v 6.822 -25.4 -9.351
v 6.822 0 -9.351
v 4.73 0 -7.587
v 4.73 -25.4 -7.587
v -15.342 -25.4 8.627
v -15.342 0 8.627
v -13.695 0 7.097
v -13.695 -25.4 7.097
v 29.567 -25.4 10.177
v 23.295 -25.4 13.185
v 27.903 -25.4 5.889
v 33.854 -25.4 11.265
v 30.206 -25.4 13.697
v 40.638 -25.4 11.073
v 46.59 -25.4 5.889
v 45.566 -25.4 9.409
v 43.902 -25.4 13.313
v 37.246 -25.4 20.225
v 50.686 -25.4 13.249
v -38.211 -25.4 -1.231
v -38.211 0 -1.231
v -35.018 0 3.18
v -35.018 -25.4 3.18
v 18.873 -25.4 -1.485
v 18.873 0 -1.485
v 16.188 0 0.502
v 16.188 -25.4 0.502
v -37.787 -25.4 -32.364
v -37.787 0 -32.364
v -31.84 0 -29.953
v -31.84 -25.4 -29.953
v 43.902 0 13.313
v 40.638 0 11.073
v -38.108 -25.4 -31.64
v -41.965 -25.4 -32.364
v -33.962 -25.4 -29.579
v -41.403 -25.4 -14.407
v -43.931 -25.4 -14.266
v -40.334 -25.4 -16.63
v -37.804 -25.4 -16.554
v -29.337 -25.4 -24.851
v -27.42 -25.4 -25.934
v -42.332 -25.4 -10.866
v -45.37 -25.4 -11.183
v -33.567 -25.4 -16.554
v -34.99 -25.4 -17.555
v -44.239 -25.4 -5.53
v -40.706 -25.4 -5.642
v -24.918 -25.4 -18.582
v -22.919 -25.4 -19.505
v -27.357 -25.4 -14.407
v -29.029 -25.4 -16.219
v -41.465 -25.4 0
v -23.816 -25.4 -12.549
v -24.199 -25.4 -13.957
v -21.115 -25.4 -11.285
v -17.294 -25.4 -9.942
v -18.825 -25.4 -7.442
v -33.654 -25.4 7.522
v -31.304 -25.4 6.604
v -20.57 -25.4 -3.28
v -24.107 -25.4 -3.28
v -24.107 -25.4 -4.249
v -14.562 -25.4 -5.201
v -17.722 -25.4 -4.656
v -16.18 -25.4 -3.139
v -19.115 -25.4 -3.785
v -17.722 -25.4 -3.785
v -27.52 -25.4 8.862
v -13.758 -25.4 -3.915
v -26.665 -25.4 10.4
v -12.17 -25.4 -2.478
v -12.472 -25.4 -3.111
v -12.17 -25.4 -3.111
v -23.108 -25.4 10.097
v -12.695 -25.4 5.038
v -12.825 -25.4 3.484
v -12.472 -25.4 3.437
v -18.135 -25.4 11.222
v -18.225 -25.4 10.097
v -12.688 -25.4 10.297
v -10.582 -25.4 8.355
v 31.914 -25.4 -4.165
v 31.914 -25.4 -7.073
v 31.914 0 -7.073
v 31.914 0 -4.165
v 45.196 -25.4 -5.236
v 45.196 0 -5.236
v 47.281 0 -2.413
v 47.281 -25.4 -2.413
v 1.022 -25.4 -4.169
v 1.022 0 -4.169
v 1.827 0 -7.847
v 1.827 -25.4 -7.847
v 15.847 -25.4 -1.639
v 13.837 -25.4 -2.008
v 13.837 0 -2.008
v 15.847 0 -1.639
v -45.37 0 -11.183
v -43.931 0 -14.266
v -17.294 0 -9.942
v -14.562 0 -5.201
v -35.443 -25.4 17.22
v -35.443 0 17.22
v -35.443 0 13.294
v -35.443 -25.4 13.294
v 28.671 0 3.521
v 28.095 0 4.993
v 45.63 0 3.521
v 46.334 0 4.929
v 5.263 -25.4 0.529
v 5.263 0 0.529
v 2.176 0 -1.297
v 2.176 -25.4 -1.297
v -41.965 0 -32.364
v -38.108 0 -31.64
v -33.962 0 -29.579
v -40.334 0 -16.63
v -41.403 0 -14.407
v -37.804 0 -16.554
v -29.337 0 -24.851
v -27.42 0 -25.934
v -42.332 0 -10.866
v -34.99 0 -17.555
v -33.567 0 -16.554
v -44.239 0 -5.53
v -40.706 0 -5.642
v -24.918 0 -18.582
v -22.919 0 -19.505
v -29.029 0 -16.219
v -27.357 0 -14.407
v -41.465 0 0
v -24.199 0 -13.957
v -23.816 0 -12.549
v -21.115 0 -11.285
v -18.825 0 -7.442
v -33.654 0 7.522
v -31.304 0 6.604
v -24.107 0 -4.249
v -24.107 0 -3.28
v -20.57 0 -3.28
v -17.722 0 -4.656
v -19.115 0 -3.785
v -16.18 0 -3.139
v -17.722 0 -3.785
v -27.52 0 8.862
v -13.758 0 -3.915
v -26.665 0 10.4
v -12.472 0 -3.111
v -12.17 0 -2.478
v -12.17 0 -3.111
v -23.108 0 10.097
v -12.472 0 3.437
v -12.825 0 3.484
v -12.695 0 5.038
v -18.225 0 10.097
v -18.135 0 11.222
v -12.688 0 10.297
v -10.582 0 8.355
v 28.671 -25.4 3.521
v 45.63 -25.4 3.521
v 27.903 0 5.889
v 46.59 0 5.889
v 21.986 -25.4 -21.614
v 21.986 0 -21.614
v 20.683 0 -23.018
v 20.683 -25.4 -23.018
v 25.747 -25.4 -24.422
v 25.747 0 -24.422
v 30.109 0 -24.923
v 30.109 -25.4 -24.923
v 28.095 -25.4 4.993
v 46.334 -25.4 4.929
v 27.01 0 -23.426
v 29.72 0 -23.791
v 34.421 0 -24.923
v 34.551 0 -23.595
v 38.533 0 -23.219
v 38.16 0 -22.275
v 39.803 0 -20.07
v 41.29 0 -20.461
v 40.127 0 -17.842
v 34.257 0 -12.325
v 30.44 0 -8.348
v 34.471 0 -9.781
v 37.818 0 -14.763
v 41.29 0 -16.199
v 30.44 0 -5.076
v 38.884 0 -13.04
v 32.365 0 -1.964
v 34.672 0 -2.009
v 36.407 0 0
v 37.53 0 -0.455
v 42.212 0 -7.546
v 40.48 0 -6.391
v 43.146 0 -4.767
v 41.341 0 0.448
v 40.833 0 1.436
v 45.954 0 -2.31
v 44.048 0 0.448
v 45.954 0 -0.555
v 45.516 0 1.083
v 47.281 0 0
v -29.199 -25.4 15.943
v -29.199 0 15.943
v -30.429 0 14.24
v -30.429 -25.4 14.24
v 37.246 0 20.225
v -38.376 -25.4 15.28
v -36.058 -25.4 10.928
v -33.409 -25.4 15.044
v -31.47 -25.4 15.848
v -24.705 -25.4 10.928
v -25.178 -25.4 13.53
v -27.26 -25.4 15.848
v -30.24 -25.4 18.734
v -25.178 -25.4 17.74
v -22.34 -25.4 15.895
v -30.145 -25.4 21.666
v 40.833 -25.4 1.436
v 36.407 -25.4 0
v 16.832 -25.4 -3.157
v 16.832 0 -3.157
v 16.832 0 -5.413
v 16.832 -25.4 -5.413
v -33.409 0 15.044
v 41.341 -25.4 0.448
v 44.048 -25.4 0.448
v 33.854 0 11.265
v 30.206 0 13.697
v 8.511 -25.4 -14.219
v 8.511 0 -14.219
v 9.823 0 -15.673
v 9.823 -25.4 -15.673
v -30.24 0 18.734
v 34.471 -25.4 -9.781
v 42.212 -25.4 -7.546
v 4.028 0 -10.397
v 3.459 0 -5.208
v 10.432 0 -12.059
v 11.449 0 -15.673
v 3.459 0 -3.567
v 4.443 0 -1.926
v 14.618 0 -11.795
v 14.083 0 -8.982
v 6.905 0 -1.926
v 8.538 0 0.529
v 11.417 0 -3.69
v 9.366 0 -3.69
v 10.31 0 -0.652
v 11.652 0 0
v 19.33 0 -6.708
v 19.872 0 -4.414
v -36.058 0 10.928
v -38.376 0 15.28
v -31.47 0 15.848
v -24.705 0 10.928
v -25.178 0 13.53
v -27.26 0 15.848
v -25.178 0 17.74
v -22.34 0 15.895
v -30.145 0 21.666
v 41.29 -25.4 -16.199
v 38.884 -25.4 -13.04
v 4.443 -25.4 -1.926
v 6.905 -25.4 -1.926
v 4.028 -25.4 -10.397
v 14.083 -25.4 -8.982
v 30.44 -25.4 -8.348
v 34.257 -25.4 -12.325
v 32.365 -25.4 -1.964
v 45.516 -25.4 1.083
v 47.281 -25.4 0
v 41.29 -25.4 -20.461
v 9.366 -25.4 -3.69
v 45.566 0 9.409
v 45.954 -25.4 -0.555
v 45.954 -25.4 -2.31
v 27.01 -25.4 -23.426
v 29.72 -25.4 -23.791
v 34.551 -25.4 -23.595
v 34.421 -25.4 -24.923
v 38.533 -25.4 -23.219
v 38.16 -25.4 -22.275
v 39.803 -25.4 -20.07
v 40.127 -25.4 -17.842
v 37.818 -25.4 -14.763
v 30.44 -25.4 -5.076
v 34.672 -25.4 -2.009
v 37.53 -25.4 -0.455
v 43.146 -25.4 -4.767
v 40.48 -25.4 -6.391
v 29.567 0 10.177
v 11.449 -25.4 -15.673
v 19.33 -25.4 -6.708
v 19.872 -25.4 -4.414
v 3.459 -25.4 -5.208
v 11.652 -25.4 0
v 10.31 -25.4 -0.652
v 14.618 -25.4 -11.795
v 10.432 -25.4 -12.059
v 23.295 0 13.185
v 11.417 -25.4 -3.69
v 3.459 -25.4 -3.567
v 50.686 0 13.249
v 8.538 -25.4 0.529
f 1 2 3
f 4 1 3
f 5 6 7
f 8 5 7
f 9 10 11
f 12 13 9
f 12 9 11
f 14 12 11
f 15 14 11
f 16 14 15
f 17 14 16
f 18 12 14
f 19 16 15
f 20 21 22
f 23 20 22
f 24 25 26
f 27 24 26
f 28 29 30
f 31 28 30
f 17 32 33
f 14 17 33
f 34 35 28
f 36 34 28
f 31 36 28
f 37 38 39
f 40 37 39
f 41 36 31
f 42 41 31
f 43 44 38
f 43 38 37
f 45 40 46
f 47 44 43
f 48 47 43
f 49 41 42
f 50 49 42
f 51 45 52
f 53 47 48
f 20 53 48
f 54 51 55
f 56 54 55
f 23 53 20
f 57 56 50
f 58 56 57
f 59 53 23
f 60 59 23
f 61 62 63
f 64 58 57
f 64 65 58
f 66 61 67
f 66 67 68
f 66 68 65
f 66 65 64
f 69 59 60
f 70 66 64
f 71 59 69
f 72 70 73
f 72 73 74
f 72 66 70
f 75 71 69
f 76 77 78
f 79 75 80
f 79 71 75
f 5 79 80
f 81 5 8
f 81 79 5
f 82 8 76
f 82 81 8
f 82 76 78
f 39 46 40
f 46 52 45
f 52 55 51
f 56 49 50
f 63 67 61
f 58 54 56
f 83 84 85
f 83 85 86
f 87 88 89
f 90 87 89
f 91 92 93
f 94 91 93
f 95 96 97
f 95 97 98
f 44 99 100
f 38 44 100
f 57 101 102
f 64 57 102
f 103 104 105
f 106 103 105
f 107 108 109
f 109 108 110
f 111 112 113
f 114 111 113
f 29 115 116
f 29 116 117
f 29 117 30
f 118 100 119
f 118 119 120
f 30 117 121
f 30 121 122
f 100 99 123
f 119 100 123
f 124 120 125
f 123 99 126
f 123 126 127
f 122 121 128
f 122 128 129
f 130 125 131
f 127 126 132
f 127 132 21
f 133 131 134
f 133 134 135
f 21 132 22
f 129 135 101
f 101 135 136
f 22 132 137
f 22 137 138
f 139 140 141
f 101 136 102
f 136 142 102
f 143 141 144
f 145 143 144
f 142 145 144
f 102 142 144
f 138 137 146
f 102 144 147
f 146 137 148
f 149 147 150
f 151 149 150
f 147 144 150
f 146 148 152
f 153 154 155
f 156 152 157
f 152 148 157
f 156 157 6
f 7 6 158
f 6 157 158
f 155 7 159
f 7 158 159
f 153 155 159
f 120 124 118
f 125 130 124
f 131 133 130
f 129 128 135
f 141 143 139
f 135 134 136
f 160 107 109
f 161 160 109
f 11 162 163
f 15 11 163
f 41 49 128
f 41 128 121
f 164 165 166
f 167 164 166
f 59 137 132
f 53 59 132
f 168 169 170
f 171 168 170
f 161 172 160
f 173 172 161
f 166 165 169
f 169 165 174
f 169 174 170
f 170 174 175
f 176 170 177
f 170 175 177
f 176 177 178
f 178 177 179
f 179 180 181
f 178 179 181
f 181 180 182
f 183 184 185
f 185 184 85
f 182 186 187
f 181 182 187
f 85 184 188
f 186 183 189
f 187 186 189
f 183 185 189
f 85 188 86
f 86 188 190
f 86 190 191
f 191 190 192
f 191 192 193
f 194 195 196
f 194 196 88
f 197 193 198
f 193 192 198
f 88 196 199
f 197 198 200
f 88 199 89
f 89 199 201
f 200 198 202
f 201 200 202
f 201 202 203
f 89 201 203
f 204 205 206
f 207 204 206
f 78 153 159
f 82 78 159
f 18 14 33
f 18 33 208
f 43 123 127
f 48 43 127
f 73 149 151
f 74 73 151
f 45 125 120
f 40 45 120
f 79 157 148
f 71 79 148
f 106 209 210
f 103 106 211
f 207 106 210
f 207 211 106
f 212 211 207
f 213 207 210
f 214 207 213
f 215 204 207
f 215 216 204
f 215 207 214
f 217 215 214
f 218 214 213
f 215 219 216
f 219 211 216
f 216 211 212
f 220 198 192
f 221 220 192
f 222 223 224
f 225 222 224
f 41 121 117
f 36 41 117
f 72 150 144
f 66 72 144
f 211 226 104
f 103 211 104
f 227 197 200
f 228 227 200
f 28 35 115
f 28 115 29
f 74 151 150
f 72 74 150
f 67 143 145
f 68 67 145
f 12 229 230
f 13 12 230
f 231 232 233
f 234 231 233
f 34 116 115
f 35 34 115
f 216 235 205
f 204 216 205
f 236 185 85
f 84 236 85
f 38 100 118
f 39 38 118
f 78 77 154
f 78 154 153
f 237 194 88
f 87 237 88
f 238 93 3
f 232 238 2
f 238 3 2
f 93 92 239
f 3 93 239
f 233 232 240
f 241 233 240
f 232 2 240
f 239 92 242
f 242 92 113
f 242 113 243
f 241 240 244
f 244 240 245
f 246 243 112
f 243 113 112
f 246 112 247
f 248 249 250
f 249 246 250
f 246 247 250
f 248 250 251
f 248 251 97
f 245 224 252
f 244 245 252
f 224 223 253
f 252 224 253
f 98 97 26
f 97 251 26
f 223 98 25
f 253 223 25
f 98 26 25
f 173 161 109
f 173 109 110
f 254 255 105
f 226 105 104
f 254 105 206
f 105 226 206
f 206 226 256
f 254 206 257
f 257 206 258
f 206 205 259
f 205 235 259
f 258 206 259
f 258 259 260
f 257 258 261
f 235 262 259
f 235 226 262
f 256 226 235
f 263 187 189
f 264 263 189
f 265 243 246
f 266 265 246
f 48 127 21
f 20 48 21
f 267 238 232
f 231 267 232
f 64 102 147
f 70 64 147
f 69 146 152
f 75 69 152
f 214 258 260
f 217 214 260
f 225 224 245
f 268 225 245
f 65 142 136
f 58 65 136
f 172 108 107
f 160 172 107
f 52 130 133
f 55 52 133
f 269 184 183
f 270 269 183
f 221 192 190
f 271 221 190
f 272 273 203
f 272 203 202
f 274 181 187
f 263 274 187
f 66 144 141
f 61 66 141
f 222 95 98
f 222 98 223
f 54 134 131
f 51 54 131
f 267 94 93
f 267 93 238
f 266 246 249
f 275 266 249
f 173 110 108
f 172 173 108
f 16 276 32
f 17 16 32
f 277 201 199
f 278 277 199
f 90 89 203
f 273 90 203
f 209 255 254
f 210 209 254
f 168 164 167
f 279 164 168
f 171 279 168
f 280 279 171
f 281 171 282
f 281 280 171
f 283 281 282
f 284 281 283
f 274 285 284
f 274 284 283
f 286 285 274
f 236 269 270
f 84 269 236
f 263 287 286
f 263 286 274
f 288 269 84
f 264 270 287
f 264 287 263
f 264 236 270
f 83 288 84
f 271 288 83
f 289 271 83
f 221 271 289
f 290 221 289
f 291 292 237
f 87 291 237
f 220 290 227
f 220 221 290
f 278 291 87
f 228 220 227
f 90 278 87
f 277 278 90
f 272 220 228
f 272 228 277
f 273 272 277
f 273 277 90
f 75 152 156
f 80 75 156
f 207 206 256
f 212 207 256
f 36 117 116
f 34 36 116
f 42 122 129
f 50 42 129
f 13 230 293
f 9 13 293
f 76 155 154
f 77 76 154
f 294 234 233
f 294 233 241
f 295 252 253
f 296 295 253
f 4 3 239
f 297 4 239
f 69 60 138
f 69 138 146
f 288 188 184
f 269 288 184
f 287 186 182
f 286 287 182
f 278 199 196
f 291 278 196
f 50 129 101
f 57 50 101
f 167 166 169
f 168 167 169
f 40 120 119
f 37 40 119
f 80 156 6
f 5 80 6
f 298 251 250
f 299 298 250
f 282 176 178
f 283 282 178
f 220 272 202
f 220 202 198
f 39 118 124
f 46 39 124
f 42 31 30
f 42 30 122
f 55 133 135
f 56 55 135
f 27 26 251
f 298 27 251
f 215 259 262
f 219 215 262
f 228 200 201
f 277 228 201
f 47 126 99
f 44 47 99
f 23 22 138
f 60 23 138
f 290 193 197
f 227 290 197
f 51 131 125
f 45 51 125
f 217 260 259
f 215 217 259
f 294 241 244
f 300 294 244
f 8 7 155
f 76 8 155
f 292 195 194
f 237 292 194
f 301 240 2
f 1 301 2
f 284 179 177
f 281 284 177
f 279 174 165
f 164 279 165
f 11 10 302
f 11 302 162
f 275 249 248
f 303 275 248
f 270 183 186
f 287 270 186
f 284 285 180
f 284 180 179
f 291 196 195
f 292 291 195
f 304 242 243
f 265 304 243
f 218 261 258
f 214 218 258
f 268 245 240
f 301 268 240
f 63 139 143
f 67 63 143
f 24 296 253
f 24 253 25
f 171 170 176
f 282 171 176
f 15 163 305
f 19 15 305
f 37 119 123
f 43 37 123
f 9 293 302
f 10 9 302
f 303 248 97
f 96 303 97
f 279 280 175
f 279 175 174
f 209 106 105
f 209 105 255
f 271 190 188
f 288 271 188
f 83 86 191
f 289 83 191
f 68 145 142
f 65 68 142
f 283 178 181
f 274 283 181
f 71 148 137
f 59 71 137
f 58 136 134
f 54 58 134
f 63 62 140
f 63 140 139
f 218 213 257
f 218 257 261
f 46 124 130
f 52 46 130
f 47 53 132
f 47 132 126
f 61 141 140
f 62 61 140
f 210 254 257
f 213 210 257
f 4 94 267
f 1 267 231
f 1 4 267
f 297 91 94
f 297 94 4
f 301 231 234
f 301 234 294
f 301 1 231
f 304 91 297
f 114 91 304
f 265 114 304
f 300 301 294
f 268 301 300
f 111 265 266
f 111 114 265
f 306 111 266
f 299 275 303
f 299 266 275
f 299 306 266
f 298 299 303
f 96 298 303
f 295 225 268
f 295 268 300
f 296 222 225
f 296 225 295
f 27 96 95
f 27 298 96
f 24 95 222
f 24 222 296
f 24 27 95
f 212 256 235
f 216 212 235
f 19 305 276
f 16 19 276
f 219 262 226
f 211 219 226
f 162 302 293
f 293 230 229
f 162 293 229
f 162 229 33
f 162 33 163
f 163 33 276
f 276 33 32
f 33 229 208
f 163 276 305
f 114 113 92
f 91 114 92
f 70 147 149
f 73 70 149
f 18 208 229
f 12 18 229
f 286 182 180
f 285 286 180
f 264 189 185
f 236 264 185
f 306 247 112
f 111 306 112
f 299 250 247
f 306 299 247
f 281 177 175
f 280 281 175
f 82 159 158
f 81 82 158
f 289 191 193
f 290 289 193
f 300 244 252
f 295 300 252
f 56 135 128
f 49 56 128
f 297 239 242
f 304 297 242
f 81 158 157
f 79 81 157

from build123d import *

# Parameters (mm, degrees)
F1_DEPTH = 25.4
F3_DEPTH = 25.4
F5_DEPTH = 25.4
F7_DEPTH = 25.4
F9_DEPTH = 25.4


with BuildPart() as f1:
    # F0 (on Front) → F1 (new body)
    with BuildSketch(Plane.XZ):
        Polygon((-12.824513, 3.484057), (-12.472193, 3.436571), (-10.582337, 8.354749), (-12.687891, 10.297082), (-18.134892, 11.222044), (-26.665105, 10.399856), (-33.65371, 7.522194), (-41.464504, 0), (-44.239391, -5.530056), (-45.369901, -11.182604), (-43.931074, -14.265814), (-40.333997, -16.629606), (-34.989763, -17.55457), (-29.028896, -16.218513), (-24.198538, -13.957493), (-21.115329, -11.285379), (-24.917953, -18.582307), (-29.337218, -24.851497), (-33.96203, -29.579083), (-38.107965, -31.640291), (-41.965403, -32.36356), (-37.78651, -32.36356), (-31.839628, -29.952662), (-27.419645, -25.934497), (-22.919299, -19.505432), (-17.293869, -9.942198), (-14.561515, -5.200762), (-13.757882, -3.914949), (-12.47207, -3.111316), (-12.170282, -3.111316), (-12.170282, -2.478154), (-16.180303, -3.139456), (-20.570222, -3.280159), (-24.106514, -3.280159), (-24.106514, -4.249332), (-19.114917, -3.784997), (-17.721914, -3.784997), (-17.721914, -4.655624), (-18.824708, -7.441632), (-23.816304, -12.549311), (-27.356856, -14.406648), (-33.567328, -16.554195), (-37.80438, -16.554195), (-41.402973, -14.406648), (-42.33164, -10.866098), (-40.706471, -5.642335), (-38.210675, -1.231158), (-35.018373, 3.18002), (-31.303696, 6.604486), (-27.52001, 8.862065), (-23.107806, 10.097482), (-18.224968, 10.097482), (-15.342328, 8.626748), (-13.695104, 7.097184), (-12.695005, 5.038156), align=None)
    extrude(amount=F1_DEPTH)


with BuildPart() as f3:
    # F2 (on Front) → F3 (new body)
    with BuildSketch(Plane.XZ):
        Polygon((43.145634, -4.766837), (40.480293, -6.390921), (42.212449, -7.545691), (45.195606, -5.236151), (47.280606, -2.413379), (47.280606, 0), (45.516375, 1.083008), (40.833142, 1.435855), (36.406521, 0), (32.364827, -1.964302), (30.440209, -5.075766), (30.440209, -8.347615), (34.257367, -12.325156), (37.817907, -14.763005), (40.127449, -17.842392), (39.80336, -20.070001), (38.160305, -22.274783), (34.551207, -23.594841), (29.720351, -23.791447), (27.010016, -23.426324), (21.98627, -21.614105), (20.682612, -23.018043), (25.74682, -24.421982), (30.109059, -24.923388), (34.421157, -24.923388), (38.532693, -23.218606), (41.290432, -20.460868), (41.290432, -16.198911), (38.883679, -13.040049), (34.471299, -9.780905), (31.914126, -7.073309), (31.914126, -4.16515), (34.671862, -2.0091), (37.529878, -0.454739), (41.340571, 0.447792), (44.048168, 0.447792), (45.953512, -0.555021), (45.953512, -2.309944), align=None)
    extrude(amount=F3_DEPTH)


with BuildPart() as f5:
    # F4 (on Front) → F5 (new body)
    with BuildSketch(Plane.XZ):
        Polygon((-35.44306, 13.293579), (-38.375892, 15.280336), (-36.058009, 10.928393), (-24.705116, 10.928393), (-22.339929, 15.895283), (-25.178153, 13.530098), (-25.178153, 17.740129), (-27.259516, 15.847981), (-30.145044, 21.666337), (-33.408999, 15.043817), (-35.44306, 17.219787), align=None)
        Polygon((-30.428866, 14.239654), (-31.469546, 15.847981), (-30.239651, 18.733507), (-29.198969, 15.942588), align=None, mode=Mode.SUBTRACT)
    extrude(amount=F5_DEPTH)


with BuildPart() as f7:
    # F6 (on Front) → F7 (new body)
    with BuildSketch(Plane.XZ):
        Polygon((29.566502, 10.176946), (23.294533, 13.184931), (27.90251, 5.888967), (46.590418, 5.888967), (50.686397, 13.248931), (45.566421, 9.40895), (43.902431, 13.31293), (40.638447, 11.072942), (37.246462, 20.224895), (33.854481, 11.264941), (30.206498, 13.696929), align=None)
        Polygon((46.334419, 4.928972), (28.094508, 4.992972), (28.670507, 3.520979), (45.630421, 3.520979), align=None)
    extrude(amount=F7_DEPTH)


with BuildPart() as f9:
    # F8 (on Front) → F9 (new body)
    with BuildSketch(Plane.XZ):
        Polygon((5.262899, 0.528663), (2.175855, -1.29672), (1.817795, -3.40304), (1.817795, -5.04392), (3.048455, -7.300131), (7.2327, -11.443353), (9.529932, -13.494453), (10.432417, -12.058684), (6.82248, -9.35123), (4.730358, -7.587284), (3.458675, -5.208008), (3.212543, -2.910776), (3.95094, -1.557049), (5.961018, -0.695587), (9.160735, -1.557049), (10.309546, -0.652467), (8.537851, 0.528663), align=None)
        Polygon((11.047747, -13.371387), (9.82275, -15.673196), (11.449007, -15.673196), (14.618124, -11.795199), (19.330099, -6.707933), (19.872185, -4.414494), (18.87274, -1.484627), (16.462652, -0.367411), (13.632133, -0.367411), (11.068932, -1.313793), (9.365845, -3.690194), (11.416945, -3.690194), (13.837243, -2.008291), (15.847322, -1.639093), (17.65229, -2.541578), (18.226597, -4.920854), (17.365135, -7.136043), (14.903815, -9.638385), align=None)
        Polygon((8.511194, -14.218742), (9.82275, -15.673196), (11.047747, -13.371387), (14.903815, -9.638385), (17.365135, -7.136043), (18.226597, -4.920854), (17.65229, -2.541578), (15.847322, -1.639093), (16.831849, -3.156908), (16.831849, -5.413118), (14.083375, -8.982033), (10.432417, -12.058684), (9.529932, -13.494453), (7.2327, -11.443353), (3.048455, -7.300131), (1.817795, -5.04392), (1.817795, -3.40304), (2.175855, -1.29672), (1.021568, -4.169014), (1.826884, -7.846624), (4.028081, -10.396792), align=None)
        Polygon((16.462652, -0.367411), (18.87274, -1.484627), (16.188353, 0.501819), (11.651739, 0), (10.309546, -0.652467), (9.160735, -1.557049), (5.961018, -0.695587), (3.95094, -1.557049), (3.212543, -2.910776), (3.458675, -5.208008), (3.458675, -3.567128), (4.443203, -1.926247), (6.904524, -1.926247), (9.365845, -3.690194), (11.068932, -1.313793), (13.632133, -0.367411), align=None)
    extrude(amount=F9_DEPTH)


solid = Compound([f1.part, f3.part, f5.part, f7.part, f9.part])
